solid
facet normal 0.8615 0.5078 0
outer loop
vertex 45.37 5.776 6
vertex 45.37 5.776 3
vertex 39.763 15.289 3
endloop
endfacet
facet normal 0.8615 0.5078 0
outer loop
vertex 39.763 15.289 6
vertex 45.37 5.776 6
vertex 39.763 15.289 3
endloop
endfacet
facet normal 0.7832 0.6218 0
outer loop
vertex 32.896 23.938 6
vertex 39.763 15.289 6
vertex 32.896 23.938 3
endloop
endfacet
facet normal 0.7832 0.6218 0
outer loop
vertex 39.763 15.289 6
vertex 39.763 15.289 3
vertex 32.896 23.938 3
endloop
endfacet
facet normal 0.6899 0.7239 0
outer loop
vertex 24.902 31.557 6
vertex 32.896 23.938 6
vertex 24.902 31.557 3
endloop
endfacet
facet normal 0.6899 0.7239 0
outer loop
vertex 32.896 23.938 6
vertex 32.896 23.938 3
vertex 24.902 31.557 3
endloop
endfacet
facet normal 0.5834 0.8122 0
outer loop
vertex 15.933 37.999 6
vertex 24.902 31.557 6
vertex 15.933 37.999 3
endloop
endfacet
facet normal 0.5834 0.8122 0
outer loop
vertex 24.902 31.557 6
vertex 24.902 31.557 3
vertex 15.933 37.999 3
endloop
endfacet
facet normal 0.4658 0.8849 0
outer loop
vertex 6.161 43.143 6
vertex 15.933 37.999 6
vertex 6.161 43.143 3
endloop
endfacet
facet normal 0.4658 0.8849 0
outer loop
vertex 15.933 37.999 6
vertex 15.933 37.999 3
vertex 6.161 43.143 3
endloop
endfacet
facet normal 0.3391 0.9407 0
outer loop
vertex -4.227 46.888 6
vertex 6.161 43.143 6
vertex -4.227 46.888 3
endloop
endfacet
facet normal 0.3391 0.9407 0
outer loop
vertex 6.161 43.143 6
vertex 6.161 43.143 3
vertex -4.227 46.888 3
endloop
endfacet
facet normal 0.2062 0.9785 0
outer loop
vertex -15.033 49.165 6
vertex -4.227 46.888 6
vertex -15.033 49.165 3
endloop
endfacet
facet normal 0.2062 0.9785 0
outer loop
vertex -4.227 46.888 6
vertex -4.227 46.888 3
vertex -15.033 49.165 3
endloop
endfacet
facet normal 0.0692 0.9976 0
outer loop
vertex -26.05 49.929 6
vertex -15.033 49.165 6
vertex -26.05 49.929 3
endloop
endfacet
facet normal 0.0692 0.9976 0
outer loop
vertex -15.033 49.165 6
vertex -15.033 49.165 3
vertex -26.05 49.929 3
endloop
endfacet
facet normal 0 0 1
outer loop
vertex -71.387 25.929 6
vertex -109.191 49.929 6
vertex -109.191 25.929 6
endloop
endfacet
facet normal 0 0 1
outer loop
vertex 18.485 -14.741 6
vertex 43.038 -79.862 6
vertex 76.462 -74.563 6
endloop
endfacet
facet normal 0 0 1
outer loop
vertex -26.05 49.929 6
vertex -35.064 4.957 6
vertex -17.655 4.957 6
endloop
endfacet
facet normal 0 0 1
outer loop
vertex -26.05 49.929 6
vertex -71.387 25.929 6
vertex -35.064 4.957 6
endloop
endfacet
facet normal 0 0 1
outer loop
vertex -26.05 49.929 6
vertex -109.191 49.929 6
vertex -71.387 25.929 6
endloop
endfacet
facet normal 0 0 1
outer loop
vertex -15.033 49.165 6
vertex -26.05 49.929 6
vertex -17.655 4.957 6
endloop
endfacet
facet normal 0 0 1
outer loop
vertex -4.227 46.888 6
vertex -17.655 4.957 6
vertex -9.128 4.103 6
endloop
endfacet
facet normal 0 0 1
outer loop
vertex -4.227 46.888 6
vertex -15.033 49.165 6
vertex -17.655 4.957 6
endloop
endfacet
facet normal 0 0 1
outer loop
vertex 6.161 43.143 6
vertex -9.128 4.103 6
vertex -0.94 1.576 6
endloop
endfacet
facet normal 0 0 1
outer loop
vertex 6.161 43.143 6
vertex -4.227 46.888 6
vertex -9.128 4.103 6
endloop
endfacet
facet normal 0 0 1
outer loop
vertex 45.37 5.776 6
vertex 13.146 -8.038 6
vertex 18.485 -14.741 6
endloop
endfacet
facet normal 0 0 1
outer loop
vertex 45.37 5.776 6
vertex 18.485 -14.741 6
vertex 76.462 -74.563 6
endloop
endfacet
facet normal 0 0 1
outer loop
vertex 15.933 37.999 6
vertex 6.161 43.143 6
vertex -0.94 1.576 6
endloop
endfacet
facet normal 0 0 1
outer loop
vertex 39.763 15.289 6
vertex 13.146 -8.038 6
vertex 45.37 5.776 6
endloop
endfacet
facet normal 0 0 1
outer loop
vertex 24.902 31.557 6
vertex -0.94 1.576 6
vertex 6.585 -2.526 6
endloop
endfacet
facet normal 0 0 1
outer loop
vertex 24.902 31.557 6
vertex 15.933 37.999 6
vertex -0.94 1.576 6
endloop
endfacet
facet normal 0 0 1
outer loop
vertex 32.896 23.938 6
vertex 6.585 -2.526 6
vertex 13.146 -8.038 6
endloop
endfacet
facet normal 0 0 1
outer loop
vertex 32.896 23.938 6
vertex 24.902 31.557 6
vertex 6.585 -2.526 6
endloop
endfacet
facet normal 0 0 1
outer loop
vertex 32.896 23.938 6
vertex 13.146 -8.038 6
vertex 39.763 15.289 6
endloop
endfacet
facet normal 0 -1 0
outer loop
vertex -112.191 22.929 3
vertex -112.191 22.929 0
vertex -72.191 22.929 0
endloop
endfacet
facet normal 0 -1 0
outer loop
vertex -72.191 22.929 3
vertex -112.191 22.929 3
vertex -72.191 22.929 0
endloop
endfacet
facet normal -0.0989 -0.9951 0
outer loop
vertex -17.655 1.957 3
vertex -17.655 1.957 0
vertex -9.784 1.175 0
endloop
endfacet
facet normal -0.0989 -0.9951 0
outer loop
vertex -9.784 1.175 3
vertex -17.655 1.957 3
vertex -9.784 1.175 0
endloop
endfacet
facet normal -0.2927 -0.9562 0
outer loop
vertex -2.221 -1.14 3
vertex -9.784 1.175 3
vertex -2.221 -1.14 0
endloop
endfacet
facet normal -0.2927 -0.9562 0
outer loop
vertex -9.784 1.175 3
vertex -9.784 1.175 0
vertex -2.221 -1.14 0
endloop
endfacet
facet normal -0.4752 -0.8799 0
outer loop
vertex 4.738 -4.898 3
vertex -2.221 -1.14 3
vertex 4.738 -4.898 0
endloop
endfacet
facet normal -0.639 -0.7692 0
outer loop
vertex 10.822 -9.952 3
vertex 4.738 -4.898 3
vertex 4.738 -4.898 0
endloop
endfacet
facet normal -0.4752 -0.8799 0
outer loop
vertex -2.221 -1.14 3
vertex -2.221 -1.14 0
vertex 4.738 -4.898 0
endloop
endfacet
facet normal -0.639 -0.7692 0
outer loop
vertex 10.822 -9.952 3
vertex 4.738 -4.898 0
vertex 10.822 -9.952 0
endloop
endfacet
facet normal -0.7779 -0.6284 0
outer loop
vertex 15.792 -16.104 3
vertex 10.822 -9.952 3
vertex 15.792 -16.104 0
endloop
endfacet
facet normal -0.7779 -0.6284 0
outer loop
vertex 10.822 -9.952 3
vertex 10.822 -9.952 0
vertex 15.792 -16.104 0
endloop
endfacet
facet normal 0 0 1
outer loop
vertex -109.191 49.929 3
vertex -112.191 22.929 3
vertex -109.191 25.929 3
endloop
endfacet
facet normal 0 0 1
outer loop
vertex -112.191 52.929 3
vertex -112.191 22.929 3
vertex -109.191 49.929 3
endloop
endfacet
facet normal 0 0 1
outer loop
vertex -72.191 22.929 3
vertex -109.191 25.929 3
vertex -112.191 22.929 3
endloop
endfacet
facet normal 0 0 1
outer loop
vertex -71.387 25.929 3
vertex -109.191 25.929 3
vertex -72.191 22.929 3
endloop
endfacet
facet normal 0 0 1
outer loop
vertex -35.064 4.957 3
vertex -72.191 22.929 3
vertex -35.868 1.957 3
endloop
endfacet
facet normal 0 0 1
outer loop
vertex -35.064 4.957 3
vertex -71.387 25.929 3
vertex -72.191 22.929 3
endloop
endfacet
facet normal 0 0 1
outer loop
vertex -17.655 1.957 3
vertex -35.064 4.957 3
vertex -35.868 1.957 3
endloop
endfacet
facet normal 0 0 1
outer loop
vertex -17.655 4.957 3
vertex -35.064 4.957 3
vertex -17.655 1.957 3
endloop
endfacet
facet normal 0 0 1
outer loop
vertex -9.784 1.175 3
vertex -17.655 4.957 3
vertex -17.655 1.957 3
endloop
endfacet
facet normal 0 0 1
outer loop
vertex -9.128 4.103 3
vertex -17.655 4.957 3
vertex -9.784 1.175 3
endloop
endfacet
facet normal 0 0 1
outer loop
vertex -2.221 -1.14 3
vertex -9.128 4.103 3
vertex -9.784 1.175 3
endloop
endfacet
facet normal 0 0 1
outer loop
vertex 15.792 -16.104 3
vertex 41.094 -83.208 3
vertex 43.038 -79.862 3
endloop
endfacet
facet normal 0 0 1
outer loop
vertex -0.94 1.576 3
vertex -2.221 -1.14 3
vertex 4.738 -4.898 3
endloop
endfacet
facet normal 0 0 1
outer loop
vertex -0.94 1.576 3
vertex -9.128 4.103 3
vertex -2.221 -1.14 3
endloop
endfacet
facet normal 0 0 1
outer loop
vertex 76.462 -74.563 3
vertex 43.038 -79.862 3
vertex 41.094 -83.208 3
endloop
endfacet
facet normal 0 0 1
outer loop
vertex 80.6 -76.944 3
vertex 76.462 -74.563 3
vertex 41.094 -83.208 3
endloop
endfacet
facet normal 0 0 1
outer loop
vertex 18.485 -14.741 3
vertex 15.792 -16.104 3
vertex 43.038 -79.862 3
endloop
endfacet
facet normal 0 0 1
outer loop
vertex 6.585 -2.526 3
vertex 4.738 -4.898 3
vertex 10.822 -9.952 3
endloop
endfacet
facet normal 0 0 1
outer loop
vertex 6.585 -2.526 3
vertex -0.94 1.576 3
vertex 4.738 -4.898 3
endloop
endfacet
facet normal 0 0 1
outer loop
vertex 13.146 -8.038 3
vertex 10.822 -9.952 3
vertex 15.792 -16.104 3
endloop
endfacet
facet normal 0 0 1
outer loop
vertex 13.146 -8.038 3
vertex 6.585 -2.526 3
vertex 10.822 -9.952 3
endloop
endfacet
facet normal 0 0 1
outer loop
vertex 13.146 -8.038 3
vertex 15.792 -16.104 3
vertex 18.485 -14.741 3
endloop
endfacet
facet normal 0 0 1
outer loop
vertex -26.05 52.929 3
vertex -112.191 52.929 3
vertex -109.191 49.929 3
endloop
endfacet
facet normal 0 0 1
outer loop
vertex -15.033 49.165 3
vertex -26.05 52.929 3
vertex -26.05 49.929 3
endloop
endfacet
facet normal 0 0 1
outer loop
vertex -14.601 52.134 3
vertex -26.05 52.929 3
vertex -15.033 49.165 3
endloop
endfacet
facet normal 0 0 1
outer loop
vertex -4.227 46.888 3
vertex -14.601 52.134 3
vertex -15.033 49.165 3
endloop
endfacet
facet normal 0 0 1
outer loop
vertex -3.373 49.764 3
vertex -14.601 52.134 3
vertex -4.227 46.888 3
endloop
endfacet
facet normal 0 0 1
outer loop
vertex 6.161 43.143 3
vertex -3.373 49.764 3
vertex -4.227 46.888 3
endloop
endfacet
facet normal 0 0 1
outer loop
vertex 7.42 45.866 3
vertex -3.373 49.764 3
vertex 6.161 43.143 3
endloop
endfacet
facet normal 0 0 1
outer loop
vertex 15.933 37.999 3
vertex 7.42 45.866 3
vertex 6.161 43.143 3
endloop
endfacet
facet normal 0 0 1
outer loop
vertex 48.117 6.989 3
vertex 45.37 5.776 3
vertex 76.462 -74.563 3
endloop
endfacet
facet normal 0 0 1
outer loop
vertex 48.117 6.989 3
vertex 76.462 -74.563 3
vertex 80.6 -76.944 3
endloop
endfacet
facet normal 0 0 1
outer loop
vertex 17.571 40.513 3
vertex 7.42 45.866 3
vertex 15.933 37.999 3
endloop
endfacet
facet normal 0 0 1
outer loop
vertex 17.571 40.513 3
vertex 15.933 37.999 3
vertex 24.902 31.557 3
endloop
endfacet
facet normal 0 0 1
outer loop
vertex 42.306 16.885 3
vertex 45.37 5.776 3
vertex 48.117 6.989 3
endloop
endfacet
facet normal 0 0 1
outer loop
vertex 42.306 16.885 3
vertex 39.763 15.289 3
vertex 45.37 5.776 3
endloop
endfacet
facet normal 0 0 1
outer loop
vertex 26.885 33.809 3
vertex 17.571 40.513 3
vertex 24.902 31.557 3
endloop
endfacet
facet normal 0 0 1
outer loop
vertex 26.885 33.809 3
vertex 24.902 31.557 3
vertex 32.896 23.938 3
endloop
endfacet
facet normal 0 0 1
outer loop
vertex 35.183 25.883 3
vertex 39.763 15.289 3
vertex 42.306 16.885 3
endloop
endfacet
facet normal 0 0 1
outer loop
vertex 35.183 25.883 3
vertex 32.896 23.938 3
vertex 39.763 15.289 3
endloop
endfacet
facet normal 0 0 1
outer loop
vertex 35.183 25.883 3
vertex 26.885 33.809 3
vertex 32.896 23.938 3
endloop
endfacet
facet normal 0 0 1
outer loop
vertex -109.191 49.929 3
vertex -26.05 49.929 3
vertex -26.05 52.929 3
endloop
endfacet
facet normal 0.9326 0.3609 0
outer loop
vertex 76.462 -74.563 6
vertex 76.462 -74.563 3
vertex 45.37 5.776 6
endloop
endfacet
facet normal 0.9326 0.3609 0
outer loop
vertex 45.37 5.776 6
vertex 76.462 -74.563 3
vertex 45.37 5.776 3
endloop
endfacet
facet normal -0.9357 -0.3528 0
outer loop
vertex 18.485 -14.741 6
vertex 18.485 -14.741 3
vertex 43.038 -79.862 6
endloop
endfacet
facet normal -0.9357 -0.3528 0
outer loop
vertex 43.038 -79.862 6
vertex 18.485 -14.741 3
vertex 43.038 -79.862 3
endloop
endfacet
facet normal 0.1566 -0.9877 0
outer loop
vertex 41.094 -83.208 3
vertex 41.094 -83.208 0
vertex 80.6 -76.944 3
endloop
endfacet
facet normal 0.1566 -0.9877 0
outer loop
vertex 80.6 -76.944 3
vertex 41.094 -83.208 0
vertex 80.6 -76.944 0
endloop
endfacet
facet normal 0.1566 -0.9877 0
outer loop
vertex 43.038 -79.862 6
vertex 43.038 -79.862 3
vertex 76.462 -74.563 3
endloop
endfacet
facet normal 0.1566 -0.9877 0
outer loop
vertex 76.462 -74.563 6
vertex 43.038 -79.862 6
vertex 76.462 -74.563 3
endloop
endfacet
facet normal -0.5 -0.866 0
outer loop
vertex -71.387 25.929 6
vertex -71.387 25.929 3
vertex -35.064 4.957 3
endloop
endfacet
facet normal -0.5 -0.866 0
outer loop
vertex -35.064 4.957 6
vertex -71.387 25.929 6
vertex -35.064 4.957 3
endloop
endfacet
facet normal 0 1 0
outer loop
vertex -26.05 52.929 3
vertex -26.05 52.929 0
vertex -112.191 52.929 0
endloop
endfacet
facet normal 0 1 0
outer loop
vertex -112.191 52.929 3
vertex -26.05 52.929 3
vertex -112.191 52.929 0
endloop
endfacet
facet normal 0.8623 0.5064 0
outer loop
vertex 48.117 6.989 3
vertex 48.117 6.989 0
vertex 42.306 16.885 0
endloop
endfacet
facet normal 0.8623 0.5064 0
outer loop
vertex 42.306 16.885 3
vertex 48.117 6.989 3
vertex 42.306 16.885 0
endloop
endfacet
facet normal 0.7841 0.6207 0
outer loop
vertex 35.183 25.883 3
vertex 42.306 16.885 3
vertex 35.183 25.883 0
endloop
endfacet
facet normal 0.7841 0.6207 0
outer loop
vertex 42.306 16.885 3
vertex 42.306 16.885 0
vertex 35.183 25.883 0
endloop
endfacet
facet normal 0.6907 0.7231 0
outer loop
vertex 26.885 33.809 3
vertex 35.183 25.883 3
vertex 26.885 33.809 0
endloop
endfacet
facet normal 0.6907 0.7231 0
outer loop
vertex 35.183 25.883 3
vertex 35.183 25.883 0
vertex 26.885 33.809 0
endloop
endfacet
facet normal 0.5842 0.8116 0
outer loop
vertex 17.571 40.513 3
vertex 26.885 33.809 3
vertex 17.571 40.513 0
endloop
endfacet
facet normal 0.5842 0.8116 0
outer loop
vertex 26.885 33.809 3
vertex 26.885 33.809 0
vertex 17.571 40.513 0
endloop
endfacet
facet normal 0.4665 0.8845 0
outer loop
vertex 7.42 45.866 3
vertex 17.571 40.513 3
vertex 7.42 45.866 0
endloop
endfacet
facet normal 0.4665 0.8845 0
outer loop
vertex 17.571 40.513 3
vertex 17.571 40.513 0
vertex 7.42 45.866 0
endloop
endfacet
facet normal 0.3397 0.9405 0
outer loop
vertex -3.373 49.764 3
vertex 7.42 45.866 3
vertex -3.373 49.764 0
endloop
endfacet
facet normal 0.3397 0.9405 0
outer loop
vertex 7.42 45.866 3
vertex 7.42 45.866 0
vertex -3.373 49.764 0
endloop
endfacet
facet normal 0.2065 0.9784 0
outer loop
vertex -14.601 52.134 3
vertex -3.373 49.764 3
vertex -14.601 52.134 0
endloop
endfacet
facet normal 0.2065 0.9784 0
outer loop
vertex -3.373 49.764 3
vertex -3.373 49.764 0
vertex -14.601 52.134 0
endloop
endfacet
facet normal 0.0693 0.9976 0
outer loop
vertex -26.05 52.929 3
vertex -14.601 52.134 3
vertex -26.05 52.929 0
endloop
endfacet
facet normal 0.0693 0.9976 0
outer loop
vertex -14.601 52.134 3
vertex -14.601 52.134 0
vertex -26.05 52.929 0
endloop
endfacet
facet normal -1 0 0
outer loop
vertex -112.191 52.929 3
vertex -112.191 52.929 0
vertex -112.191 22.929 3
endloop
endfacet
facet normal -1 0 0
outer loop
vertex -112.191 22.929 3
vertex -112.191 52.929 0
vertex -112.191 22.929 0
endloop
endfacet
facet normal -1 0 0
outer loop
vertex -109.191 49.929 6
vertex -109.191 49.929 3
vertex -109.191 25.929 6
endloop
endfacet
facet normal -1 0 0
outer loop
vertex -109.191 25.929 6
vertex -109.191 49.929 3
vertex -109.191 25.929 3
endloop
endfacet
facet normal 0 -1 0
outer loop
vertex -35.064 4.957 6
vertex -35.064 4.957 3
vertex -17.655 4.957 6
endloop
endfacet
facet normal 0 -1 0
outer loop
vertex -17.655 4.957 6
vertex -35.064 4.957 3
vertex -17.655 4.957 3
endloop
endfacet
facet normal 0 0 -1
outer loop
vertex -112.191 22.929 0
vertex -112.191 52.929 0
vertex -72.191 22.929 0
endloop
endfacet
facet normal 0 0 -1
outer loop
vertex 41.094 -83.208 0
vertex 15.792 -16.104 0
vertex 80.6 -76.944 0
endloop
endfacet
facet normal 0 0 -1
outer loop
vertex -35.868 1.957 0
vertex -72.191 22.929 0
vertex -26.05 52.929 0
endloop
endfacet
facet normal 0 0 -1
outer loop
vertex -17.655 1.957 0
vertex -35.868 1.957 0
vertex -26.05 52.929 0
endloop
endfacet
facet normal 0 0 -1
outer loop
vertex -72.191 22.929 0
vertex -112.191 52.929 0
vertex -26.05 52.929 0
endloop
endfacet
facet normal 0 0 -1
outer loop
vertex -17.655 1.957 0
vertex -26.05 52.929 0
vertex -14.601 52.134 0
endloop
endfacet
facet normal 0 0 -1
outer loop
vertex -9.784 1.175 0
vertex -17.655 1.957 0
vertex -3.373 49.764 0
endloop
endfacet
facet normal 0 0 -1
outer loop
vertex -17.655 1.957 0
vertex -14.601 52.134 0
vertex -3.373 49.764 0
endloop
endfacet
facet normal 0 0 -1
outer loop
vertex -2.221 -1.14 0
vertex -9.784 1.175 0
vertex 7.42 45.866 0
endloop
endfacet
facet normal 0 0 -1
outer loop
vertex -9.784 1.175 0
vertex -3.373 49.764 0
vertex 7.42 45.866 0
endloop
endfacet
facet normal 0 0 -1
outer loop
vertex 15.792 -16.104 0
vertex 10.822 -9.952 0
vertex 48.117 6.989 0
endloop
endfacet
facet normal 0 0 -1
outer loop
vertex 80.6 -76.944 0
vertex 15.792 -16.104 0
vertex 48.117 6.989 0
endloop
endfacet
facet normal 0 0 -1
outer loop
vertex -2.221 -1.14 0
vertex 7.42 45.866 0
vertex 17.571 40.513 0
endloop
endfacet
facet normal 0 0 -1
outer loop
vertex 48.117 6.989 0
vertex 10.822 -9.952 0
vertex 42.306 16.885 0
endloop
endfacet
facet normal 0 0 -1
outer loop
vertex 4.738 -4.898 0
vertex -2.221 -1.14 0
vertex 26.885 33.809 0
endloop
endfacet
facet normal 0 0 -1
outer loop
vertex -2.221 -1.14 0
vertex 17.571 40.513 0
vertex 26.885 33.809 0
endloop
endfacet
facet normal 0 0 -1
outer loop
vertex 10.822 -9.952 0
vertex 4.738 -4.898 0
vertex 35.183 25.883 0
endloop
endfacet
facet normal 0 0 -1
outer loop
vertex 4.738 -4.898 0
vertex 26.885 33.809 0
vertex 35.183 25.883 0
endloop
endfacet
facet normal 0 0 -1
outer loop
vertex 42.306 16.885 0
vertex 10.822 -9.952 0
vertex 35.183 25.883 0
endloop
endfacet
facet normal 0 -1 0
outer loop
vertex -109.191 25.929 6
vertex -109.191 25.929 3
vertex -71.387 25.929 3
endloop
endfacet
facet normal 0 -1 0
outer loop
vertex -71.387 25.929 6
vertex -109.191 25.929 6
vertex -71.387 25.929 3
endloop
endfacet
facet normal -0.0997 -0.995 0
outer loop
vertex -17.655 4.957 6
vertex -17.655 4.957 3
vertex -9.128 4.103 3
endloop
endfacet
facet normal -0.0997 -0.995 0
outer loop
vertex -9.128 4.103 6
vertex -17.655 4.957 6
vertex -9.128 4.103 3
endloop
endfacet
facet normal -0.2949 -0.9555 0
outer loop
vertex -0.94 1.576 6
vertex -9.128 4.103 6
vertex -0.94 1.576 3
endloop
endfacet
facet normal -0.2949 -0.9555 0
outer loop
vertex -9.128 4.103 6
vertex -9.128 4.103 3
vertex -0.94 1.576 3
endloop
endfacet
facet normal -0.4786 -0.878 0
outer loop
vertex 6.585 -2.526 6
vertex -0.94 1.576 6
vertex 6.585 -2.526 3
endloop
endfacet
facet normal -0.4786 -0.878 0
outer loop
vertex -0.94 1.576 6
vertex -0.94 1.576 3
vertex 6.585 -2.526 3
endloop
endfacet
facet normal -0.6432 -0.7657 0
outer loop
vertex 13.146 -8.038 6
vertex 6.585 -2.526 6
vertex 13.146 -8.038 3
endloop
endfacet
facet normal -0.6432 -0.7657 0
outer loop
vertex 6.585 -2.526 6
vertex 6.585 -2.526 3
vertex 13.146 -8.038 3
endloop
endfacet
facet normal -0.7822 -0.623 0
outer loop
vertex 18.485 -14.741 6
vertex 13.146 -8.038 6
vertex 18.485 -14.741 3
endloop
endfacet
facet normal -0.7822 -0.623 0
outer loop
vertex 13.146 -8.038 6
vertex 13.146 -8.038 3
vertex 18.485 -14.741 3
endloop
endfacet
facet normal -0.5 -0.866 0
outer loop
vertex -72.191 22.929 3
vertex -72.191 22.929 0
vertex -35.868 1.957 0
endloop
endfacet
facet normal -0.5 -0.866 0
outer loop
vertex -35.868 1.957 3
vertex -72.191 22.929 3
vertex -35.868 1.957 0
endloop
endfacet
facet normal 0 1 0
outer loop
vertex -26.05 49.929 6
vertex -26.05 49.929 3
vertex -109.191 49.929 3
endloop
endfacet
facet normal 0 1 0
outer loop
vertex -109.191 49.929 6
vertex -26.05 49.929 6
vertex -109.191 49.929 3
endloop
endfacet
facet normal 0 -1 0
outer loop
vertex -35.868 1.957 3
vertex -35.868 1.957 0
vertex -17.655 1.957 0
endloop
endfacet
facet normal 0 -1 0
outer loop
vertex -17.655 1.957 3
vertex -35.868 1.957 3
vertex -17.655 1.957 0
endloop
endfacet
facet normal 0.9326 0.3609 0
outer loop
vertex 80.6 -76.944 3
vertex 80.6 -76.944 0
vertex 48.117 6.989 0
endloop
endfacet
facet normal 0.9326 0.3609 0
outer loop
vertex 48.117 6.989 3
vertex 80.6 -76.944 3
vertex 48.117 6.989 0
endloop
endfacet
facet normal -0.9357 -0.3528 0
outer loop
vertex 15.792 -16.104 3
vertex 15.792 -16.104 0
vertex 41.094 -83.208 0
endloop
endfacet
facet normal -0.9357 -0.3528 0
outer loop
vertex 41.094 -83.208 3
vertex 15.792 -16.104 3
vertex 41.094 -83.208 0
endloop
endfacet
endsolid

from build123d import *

# Parameters (mm, degrees)
F1_DEPTH = 3
F3_DEPTH = 3


with BuildPart() as f1:
    # F0 (on Top) → F1 (new body)
    with BuildSketch(Plane.XY):
        with BuildLine():
            Line((-26.049673, 52.928504), (-112.191005, 52.928504))
            Line((-112.191005, 52.928504), (-112.191005, 22.928504))
            Line((-112.191005, 22.928504), (-72.191005, 22.928504))
            Line((-72.191005, 22.928504), (-35.867805, 1.957295))
            Line((-35.867805, 1.957295), (-17.654659, 1.957295))
            ThreePointArc((-17.654659, 1.957295), (1.351351, -2.846519), (15.792295, -16.104127))
            Line((15.792295, -16.104127), (41.093565, -83.207551))
            Line((41.093565, -83.207551), (80.600171, -76.944318))
            Line((80.600171, -76.944318), (48.117351, 6.989384))
            ThreePointArc((48.117351, 6.989384), (17.57128, 40.513403), (-26.049673, 52.928504))
        make_face()
    extrude(amount=F1_DEPTH)

    # F2 (on face) → F3 (join)
    with BuildSketch(Plane.XY.offset(3)):
        with BuildLine():
            Line((-35.063957, 4.957295), (-17.654659, 4.957295))
            ThreePointArc((-17.654659, 4.957295), (2.924994, -0.287204), (18.484649, -14.741409))
            Line((18.484649, -14.741409), (43.038213, -79.861787))
            Line((43.038213, -79.861787), (76.46174, -74.562943))
            Line((76.46174, -74.562943), (45.370091, 5.776055))
            ThreePointArc((45.370091, 5.776055), (15.933126, 37.999173), (-26.049673, 49.928504))
            Line((-26.049673, 49.928504), (-109.191005, 49.928504))
            Line((-109.191005, 49.928504), (-109.191005, 25.928504))
            Line((-109.191005, 25.928504), (-71.387158, 25.928504))
            Line((-71.387158, 25.928504), (-35.063957, 4.957295))
        make_face()
    extrude(amount=F3_DEPTH)


solid = f1.part
